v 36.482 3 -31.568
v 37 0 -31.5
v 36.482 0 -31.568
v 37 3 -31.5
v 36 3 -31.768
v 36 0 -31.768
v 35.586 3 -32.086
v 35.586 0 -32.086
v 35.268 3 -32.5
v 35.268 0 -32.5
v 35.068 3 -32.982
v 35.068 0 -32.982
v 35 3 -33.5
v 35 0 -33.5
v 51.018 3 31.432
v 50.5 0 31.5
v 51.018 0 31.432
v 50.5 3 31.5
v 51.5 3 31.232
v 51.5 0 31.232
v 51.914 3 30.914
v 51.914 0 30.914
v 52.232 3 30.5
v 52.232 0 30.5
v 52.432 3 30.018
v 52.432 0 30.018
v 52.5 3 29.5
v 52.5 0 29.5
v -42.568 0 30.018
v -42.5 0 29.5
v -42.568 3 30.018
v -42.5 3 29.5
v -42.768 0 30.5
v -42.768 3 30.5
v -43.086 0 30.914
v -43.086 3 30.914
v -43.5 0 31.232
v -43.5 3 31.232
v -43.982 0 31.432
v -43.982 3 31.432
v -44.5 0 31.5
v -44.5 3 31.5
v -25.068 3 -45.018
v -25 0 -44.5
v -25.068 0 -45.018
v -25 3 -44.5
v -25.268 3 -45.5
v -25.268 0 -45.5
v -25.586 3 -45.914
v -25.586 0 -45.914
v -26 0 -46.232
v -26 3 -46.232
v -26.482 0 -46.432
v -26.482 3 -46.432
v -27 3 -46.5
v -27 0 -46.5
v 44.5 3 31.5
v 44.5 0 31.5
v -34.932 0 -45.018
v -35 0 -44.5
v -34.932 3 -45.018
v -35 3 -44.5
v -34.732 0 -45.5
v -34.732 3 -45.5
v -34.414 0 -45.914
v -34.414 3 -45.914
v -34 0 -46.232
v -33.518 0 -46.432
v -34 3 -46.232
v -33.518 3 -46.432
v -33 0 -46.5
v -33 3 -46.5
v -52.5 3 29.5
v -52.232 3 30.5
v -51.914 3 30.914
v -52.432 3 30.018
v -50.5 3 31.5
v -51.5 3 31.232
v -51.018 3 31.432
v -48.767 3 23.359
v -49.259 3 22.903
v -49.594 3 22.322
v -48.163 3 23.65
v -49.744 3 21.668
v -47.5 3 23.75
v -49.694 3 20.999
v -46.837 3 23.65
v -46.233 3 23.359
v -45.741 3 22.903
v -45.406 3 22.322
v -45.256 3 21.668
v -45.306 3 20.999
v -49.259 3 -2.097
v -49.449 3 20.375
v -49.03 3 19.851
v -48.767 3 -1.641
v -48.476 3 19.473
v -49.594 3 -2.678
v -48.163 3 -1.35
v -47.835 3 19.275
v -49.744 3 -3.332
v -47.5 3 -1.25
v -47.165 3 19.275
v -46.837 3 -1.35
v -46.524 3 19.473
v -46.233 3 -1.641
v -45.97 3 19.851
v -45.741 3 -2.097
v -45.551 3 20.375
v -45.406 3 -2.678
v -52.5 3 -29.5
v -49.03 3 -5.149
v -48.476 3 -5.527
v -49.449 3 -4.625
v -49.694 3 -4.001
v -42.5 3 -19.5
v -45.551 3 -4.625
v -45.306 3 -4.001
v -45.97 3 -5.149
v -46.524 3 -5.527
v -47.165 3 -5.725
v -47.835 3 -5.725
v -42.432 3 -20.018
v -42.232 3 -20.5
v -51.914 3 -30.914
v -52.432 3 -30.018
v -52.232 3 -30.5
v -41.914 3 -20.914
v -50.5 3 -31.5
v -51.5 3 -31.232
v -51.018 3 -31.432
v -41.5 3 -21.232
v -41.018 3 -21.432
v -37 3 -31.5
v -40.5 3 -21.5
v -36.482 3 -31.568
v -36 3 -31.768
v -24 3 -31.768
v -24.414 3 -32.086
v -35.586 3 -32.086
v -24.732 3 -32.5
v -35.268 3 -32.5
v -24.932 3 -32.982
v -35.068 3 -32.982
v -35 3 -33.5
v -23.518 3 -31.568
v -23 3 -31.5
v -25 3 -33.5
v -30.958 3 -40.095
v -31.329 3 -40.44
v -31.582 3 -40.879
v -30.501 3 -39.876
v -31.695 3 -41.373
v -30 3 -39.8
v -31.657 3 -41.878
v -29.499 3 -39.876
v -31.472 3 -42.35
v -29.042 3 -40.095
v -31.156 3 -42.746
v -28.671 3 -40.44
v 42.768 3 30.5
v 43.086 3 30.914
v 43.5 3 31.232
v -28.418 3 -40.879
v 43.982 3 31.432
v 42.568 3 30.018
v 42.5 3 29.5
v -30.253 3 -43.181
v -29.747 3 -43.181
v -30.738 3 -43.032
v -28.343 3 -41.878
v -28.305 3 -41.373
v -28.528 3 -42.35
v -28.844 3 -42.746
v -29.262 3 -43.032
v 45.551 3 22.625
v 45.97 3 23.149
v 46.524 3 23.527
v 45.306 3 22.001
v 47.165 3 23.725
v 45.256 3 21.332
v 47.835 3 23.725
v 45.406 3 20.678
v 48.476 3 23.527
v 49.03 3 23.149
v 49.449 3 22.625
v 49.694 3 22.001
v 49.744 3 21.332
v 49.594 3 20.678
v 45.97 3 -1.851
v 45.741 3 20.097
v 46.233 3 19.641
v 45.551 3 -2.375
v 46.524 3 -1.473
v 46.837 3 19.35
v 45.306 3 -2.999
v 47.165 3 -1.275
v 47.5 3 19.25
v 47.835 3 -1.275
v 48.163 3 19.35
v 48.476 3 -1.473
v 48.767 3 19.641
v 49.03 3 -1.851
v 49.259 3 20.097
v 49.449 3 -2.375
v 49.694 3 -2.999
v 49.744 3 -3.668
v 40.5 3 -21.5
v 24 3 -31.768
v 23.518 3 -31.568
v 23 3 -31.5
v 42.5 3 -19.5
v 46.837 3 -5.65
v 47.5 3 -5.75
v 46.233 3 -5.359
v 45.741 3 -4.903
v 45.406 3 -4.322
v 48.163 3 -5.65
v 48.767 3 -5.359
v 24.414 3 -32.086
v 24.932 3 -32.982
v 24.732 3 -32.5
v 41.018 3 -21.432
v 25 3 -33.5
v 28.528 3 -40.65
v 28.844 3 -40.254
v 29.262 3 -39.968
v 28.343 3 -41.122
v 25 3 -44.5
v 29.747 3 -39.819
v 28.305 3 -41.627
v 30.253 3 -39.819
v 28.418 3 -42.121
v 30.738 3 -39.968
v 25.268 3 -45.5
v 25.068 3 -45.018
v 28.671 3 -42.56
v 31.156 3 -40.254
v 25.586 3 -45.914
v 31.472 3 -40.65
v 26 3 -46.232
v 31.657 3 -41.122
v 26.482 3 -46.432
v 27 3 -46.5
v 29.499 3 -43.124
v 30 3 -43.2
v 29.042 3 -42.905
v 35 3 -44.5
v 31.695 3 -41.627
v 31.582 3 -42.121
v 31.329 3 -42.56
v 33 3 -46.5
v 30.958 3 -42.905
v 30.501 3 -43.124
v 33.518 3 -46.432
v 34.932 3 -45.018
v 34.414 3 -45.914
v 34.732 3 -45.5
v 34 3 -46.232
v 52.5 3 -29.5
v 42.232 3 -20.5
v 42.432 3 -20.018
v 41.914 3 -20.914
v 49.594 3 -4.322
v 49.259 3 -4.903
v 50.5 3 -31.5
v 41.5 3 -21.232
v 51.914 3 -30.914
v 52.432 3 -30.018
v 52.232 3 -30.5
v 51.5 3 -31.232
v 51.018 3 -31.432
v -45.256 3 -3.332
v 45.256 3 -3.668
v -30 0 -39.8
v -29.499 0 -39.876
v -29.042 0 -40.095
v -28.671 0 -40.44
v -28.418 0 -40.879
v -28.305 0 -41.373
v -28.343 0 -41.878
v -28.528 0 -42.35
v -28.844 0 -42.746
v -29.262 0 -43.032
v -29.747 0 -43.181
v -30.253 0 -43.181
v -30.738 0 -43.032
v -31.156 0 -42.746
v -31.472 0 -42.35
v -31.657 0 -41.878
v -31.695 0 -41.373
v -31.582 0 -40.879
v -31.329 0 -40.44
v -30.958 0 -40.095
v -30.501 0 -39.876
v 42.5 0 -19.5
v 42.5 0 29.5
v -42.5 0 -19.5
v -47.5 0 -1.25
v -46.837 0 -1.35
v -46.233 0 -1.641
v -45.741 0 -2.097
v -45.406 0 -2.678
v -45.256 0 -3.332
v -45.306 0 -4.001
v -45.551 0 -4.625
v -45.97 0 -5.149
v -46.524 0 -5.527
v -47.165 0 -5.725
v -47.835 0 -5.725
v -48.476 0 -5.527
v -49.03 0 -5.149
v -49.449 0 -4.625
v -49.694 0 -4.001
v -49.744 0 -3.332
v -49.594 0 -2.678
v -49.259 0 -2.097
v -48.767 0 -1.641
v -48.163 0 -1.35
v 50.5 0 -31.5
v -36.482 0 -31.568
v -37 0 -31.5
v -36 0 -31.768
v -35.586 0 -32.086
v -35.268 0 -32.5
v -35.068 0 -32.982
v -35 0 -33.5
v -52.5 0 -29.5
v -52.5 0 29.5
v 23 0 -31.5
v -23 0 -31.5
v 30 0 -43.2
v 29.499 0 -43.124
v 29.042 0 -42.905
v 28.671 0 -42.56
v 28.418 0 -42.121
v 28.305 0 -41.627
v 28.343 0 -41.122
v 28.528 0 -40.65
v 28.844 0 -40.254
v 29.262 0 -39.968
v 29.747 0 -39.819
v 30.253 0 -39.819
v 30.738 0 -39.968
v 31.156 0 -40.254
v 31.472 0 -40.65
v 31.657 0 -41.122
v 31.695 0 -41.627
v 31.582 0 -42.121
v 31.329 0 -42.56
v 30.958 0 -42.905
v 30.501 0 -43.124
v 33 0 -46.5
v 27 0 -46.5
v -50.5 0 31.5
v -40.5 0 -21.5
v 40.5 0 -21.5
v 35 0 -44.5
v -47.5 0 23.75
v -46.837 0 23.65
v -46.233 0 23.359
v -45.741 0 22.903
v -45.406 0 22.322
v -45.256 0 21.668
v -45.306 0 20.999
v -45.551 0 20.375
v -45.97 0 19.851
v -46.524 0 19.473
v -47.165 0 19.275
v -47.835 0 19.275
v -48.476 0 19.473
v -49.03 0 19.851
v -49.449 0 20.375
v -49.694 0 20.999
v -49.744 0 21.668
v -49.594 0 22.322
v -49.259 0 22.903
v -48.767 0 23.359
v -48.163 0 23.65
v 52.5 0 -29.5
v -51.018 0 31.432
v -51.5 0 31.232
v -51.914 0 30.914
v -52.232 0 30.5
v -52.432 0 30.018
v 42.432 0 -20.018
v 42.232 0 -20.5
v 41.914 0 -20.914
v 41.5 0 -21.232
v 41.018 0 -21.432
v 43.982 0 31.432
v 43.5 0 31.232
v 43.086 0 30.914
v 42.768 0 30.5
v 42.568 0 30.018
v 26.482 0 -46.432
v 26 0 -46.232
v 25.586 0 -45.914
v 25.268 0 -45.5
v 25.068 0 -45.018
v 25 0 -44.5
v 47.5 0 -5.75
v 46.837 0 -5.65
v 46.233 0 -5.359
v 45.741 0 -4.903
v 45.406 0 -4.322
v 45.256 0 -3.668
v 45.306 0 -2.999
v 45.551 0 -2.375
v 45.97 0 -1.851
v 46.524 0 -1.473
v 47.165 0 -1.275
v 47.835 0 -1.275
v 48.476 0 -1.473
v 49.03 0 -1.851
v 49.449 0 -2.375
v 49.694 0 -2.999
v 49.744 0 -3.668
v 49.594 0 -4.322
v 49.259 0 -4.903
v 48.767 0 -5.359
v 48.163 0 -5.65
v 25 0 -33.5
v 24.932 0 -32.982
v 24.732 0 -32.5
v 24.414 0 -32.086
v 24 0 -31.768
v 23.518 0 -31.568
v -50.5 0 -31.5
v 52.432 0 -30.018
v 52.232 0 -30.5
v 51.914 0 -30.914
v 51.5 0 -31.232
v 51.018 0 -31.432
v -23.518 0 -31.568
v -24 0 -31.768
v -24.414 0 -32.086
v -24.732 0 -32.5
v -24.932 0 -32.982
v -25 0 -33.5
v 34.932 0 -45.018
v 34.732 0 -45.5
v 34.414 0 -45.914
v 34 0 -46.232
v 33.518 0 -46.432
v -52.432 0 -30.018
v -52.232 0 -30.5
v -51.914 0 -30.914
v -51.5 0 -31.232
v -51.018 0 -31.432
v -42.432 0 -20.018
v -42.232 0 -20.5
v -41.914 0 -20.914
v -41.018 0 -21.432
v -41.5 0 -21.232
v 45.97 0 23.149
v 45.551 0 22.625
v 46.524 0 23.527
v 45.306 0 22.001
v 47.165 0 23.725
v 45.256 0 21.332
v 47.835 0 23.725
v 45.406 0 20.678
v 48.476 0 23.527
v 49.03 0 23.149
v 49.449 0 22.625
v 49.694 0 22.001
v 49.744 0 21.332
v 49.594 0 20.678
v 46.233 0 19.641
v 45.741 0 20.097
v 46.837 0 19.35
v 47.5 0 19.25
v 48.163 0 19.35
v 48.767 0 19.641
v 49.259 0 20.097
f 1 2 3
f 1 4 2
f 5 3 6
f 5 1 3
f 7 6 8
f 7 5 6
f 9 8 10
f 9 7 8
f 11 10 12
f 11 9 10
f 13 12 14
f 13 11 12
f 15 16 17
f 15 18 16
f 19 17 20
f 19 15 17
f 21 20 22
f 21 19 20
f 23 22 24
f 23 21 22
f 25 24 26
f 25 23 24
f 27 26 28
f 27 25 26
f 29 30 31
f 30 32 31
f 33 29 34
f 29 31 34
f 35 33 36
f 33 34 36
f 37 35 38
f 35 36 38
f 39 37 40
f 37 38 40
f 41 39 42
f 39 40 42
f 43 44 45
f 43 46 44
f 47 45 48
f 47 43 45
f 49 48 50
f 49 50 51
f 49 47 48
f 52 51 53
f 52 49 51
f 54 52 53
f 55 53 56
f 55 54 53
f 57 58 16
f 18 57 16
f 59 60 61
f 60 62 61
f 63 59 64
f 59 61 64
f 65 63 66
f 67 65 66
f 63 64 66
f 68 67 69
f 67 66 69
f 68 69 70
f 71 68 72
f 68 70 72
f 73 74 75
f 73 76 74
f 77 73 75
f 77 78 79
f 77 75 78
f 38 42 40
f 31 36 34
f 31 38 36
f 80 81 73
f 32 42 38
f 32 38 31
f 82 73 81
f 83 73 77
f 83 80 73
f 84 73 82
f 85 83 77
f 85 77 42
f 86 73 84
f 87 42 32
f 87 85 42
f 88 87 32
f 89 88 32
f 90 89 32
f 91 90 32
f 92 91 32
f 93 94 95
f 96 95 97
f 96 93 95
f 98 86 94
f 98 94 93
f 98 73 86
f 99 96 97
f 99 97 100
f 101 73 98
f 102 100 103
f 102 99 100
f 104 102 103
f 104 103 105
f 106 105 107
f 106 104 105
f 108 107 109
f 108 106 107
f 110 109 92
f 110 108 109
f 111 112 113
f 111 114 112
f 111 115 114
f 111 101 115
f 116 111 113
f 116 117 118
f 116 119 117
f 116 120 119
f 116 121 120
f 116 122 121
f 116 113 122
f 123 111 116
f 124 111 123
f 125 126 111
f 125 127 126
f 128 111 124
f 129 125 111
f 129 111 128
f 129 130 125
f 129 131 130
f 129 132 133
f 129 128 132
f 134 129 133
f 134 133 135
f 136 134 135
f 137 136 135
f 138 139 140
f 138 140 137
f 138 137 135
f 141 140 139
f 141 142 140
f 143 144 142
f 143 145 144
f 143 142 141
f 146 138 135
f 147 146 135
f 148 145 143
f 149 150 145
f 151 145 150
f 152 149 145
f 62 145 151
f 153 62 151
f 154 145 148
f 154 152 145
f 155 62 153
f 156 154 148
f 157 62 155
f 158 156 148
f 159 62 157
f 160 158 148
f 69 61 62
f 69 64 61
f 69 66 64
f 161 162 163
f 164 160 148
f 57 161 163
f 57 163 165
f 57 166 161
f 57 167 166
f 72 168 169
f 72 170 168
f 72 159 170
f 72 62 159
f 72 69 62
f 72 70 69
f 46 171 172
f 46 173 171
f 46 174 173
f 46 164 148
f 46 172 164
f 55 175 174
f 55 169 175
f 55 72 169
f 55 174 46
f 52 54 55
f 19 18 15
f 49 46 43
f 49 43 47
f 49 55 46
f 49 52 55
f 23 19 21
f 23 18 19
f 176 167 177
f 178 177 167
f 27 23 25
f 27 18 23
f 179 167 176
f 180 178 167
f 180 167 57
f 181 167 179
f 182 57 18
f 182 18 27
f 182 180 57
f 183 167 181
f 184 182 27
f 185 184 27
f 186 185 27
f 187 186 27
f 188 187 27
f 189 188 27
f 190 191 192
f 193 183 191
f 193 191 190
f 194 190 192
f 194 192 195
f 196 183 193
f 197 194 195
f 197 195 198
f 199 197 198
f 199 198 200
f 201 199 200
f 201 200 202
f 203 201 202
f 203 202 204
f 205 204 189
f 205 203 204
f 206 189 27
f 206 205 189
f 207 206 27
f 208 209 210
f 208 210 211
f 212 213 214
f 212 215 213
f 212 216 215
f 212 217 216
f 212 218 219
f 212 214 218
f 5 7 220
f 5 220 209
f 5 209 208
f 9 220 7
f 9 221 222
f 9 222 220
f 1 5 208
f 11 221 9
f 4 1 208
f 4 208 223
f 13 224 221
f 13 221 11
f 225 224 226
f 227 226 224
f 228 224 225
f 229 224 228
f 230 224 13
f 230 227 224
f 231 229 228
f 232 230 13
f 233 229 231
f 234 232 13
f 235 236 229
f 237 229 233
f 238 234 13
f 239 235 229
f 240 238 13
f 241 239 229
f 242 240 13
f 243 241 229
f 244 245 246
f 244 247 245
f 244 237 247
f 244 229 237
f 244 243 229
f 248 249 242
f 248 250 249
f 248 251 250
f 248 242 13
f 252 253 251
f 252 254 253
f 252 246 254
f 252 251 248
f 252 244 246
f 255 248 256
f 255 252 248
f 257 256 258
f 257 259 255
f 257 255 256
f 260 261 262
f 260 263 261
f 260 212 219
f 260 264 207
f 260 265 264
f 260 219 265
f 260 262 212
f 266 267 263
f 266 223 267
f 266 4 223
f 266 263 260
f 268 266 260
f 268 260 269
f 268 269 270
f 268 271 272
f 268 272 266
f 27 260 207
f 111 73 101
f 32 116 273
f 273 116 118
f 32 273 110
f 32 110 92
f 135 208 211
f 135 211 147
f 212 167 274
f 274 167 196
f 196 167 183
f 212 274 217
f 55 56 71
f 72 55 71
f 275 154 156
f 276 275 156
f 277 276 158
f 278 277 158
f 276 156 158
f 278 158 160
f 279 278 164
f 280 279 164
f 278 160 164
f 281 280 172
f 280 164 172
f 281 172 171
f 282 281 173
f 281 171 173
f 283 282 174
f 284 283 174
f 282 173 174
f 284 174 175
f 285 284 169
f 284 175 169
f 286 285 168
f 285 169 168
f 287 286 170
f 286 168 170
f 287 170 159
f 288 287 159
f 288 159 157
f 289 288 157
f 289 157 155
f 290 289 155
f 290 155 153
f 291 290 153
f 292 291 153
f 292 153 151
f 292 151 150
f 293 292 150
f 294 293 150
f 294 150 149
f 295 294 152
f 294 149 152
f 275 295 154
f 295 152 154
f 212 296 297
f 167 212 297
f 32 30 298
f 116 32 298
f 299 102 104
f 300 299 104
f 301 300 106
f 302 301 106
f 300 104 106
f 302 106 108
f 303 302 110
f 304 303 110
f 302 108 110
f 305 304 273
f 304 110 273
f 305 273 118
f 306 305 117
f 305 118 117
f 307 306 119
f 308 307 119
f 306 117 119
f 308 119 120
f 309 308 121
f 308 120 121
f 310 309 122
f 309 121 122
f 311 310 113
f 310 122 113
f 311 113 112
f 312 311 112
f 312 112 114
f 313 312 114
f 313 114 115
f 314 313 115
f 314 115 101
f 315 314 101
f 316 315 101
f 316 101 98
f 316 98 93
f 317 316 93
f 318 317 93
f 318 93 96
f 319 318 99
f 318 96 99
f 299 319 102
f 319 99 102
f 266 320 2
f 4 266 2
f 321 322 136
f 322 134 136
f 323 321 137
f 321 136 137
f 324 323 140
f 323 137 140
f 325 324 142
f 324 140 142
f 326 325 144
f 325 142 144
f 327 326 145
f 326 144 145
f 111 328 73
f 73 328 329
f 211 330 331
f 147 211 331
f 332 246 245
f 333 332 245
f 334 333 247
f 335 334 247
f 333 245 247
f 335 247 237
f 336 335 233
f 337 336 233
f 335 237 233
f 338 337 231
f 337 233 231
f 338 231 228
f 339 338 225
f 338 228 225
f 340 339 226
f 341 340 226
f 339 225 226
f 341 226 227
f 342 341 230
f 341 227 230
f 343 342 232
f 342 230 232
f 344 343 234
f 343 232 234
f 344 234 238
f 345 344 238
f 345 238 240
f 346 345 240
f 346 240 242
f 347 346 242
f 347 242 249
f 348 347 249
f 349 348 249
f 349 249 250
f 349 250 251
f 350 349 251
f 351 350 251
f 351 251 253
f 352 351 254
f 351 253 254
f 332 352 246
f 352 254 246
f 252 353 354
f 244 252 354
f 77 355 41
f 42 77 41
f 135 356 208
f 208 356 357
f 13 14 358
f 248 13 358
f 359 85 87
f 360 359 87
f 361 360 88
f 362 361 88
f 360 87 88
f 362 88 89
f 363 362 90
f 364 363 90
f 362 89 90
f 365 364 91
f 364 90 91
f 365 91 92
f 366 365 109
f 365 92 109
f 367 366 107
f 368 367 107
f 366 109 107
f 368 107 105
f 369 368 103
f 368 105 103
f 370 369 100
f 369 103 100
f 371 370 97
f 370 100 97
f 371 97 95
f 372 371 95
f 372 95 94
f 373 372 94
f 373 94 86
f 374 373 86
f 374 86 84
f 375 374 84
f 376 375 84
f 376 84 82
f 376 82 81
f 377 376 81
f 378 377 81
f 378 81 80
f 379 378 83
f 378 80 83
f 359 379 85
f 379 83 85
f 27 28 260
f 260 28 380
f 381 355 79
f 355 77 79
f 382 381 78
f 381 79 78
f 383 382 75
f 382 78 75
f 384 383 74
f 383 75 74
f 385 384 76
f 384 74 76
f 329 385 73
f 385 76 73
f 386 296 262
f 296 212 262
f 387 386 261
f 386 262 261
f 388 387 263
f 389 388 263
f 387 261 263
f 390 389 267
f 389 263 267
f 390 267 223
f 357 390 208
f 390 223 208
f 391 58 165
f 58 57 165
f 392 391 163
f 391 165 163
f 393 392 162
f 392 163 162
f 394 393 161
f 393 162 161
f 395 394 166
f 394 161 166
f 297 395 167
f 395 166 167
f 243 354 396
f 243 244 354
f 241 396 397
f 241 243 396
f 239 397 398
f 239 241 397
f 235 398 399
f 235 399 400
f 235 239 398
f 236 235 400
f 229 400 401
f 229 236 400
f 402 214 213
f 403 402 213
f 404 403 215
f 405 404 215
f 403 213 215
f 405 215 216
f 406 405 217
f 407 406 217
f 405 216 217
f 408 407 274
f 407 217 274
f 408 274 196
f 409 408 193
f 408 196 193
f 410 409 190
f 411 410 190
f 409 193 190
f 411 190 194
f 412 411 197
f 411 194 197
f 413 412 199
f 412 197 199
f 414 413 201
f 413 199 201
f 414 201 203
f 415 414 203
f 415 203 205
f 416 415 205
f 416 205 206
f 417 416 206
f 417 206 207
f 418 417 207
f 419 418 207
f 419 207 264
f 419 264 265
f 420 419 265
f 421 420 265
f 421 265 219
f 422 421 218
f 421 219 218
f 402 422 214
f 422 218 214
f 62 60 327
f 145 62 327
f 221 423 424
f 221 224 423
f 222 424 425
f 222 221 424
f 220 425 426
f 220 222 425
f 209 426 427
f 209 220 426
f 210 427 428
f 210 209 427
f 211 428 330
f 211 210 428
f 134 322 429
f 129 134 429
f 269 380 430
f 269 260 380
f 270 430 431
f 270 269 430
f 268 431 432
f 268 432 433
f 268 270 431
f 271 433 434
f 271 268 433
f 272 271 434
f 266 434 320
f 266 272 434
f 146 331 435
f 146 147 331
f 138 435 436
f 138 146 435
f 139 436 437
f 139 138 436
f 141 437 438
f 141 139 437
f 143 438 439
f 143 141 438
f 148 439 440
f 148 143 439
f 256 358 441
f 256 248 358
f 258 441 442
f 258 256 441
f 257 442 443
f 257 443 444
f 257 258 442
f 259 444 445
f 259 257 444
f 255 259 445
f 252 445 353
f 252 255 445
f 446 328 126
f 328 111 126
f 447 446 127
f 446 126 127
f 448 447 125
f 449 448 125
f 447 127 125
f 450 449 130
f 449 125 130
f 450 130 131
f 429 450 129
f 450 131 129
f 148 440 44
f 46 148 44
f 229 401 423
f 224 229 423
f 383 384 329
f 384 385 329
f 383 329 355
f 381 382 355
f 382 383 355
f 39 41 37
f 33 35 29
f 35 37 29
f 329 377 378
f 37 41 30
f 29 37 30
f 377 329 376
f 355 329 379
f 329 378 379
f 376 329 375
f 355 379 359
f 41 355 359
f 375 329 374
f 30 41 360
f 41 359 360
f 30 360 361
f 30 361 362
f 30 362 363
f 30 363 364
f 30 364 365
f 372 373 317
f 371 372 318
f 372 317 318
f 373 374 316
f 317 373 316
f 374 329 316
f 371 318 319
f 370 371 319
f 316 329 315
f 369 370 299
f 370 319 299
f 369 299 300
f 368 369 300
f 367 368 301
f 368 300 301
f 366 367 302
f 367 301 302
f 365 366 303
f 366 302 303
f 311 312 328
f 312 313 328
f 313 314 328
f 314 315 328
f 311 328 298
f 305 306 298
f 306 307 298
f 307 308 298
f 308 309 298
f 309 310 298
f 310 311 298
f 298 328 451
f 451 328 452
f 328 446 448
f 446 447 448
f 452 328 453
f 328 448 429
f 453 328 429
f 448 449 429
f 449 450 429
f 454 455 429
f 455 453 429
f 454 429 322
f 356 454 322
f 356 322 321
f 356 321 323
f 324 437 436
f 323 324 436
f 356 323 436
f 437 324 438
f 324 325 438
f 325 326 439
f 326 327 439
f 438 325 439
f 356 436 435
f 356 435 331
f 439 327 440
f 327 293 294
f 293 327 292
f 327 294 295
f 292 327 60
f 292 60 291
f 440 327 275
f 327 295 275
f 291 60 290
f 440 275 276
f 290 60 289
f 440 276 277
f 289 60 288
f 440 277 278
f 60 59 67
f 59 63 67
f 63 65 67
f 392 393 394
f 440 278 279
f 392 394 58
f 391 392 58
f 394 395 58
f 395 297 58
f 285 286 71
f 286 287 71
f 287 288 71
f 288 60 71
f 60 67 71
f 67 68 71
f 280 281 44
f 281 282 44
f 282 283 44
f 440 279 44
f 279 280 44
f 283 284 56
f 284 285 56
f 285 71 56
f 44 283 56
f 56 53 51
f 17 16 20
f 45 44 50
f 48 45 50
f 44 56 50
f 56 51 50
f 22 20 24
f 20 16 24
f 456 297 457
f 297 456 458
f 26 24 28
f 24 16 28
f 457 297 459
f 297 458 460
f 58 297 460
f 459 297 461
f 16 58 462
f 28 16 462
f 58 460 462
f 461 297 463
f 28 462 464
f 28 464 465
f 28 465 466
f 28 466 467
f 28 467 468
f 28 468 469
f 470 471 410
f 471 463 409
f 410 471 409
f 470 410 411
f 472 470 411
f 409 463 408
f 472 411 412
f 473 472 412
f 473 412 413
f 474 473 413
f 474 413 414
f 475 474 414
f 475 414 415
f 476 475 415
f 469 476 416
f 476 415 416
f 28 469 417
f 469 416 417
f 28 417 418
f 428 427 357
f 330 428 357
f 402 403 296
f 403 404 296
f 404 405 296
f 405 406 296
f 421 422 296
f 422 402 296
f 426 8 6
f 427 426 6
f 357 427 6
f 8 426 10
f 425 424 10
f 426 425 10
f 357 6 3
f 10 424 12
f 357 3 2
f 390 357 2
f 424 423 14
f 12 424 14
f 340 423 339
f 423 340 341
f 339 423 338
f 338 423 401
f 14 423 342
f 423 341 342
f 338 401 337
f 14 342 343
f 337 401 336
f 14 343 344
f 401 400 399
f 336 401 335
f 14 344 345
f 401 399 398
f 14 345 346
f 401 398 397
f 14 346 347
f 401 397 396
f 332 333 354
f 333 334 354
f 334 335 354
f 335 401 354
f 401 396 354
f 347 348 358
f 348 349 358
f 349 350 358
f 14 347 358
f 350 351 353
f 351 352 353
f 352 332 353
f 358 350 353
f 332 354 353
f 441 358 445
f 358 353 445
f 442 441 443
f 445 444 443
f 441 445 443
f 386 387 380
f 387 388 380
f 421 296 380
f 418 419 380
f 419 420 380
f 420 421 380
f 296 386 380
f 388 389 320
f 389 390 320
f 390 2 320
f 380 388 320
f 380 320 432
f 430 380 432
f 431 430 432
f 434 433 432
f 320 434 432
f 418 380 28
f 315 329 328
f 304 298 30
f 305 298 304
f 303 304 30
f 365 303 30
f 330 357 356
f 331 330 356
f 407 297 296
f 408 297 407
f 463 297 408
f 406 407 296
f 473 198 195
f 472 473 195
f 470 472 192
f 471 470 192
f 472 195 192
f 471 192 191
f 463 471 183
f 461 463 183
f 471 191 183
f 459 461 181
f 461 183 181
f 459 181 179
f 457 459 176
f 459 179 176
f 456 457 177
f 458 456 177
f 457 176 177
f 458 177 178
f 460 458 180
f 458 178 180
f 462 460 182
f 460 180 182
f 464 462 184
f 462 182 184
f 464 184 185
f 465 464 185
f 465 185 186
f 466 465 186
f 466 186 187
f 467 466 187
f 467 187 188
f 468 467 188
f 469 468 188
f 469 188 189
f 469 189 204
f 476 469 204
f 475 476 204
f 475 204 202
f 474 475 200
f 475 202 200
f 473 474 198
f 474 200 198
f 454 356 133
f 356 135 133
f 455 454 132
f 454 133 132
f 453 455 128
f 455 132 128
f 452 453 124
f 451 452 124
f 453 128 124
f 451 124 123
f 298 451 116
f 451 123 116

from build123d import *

# Parameters (mm, degrees)
EXTRUDE_1_DEPTH     = 3
SKETCH_2_R          = 2.25
SKETCH_2_R_2        = 1.7
CUT_EXTRUDE_1_DEPTH = 3
FILLET_1_R          = 2


with BuildPart() as part:
    # 草图1 → 凸台-拉伸1 (new body)
    with BuildSketch(Plane(origin=(0, 0, 0), x_dir=(1, 0, 0), z_dir=(0, 1, 0))):
        Polygon((42.5, -31.5), (52.5, -31.5), (52.5, 31.5), (35, 31.5), (35, 46.5), (25, 46.5), (25, 31.5), (-25, 31.5), (-25, 46.5), (-35, 46.5), (-35, 31.5), (-52.5, 31.5), (-52.5, -31.5), (-42.5, -31.5), (-42.5, 21.5), (42.5, 21.5), align=None)
    extrude(amount=EXTRUDE_1_DEPTH)

    # 草图2 → 切除-拉伸1 (cut)
    with BuildSketch(Plane(origin=(0, 3, 0), x_dir=(1, 0, 0), z_dir=(0, 1, 0))):
        with Locations(Location((-47.5, -21.5, 0), (0, 0, 270))):
            Circle(SKETCH_2_R)
        with Locations(Location((-47.5, 3.5, 0), (0, 0, 270))):
            Circle(SKETCH_2_R)
        with Locations(Location((-30, 41.5, 0), (0, 0, 270))):
            Circle(SKETCH_2_R_2)
        with Locations(Location((47.5, -21.5, 0), (0, 0, 90))):
            Circle(SKETCH_2_R)
        with Locations(Location((47.5, 3.5, 0), (0, 0, 90))):
            Circle(SKETCH_2_R)
        with Locations(Location((30, 41.5, 0), (0, 0, 90))):
            Circle(SKETCH_2_R_2)
    extrude(amount=-CUT_EXTRUDE_1_DEPTH, mode=Mode.SUBTRACT)

    # 圆角1
    fillet_1_edges = [part.edges().sort_by_distance(p)[0] for p in [
        (52.5, 1.5, -31.5),
        (52.5, 1.5, 31.5),
        (42.5, 1.5, 31.5),
        (42.5, 1.5, -21.5),
        (-42.5, 1.5, -21.5),
        (-42.5, 1.5, 31.5),
        (-52.5, 1.5, 31.5),
        (-52.5, 1.5, -31.5),
        (-35, 1.5, -31.5),
        (-35, 1.5, -46.5),
        (-25, 1.5, -46.5),
        (-25, 1.5, -31.5),
        (25, 1.5, -31.5),
        (25, 1.5, -46.5),
        (35, 1.5, -46.5),
        (35, 1.5, -31.5),
    ]]
    fillet(fillet_1_edges, radius=FILLET_1_R)


solid = part.part
